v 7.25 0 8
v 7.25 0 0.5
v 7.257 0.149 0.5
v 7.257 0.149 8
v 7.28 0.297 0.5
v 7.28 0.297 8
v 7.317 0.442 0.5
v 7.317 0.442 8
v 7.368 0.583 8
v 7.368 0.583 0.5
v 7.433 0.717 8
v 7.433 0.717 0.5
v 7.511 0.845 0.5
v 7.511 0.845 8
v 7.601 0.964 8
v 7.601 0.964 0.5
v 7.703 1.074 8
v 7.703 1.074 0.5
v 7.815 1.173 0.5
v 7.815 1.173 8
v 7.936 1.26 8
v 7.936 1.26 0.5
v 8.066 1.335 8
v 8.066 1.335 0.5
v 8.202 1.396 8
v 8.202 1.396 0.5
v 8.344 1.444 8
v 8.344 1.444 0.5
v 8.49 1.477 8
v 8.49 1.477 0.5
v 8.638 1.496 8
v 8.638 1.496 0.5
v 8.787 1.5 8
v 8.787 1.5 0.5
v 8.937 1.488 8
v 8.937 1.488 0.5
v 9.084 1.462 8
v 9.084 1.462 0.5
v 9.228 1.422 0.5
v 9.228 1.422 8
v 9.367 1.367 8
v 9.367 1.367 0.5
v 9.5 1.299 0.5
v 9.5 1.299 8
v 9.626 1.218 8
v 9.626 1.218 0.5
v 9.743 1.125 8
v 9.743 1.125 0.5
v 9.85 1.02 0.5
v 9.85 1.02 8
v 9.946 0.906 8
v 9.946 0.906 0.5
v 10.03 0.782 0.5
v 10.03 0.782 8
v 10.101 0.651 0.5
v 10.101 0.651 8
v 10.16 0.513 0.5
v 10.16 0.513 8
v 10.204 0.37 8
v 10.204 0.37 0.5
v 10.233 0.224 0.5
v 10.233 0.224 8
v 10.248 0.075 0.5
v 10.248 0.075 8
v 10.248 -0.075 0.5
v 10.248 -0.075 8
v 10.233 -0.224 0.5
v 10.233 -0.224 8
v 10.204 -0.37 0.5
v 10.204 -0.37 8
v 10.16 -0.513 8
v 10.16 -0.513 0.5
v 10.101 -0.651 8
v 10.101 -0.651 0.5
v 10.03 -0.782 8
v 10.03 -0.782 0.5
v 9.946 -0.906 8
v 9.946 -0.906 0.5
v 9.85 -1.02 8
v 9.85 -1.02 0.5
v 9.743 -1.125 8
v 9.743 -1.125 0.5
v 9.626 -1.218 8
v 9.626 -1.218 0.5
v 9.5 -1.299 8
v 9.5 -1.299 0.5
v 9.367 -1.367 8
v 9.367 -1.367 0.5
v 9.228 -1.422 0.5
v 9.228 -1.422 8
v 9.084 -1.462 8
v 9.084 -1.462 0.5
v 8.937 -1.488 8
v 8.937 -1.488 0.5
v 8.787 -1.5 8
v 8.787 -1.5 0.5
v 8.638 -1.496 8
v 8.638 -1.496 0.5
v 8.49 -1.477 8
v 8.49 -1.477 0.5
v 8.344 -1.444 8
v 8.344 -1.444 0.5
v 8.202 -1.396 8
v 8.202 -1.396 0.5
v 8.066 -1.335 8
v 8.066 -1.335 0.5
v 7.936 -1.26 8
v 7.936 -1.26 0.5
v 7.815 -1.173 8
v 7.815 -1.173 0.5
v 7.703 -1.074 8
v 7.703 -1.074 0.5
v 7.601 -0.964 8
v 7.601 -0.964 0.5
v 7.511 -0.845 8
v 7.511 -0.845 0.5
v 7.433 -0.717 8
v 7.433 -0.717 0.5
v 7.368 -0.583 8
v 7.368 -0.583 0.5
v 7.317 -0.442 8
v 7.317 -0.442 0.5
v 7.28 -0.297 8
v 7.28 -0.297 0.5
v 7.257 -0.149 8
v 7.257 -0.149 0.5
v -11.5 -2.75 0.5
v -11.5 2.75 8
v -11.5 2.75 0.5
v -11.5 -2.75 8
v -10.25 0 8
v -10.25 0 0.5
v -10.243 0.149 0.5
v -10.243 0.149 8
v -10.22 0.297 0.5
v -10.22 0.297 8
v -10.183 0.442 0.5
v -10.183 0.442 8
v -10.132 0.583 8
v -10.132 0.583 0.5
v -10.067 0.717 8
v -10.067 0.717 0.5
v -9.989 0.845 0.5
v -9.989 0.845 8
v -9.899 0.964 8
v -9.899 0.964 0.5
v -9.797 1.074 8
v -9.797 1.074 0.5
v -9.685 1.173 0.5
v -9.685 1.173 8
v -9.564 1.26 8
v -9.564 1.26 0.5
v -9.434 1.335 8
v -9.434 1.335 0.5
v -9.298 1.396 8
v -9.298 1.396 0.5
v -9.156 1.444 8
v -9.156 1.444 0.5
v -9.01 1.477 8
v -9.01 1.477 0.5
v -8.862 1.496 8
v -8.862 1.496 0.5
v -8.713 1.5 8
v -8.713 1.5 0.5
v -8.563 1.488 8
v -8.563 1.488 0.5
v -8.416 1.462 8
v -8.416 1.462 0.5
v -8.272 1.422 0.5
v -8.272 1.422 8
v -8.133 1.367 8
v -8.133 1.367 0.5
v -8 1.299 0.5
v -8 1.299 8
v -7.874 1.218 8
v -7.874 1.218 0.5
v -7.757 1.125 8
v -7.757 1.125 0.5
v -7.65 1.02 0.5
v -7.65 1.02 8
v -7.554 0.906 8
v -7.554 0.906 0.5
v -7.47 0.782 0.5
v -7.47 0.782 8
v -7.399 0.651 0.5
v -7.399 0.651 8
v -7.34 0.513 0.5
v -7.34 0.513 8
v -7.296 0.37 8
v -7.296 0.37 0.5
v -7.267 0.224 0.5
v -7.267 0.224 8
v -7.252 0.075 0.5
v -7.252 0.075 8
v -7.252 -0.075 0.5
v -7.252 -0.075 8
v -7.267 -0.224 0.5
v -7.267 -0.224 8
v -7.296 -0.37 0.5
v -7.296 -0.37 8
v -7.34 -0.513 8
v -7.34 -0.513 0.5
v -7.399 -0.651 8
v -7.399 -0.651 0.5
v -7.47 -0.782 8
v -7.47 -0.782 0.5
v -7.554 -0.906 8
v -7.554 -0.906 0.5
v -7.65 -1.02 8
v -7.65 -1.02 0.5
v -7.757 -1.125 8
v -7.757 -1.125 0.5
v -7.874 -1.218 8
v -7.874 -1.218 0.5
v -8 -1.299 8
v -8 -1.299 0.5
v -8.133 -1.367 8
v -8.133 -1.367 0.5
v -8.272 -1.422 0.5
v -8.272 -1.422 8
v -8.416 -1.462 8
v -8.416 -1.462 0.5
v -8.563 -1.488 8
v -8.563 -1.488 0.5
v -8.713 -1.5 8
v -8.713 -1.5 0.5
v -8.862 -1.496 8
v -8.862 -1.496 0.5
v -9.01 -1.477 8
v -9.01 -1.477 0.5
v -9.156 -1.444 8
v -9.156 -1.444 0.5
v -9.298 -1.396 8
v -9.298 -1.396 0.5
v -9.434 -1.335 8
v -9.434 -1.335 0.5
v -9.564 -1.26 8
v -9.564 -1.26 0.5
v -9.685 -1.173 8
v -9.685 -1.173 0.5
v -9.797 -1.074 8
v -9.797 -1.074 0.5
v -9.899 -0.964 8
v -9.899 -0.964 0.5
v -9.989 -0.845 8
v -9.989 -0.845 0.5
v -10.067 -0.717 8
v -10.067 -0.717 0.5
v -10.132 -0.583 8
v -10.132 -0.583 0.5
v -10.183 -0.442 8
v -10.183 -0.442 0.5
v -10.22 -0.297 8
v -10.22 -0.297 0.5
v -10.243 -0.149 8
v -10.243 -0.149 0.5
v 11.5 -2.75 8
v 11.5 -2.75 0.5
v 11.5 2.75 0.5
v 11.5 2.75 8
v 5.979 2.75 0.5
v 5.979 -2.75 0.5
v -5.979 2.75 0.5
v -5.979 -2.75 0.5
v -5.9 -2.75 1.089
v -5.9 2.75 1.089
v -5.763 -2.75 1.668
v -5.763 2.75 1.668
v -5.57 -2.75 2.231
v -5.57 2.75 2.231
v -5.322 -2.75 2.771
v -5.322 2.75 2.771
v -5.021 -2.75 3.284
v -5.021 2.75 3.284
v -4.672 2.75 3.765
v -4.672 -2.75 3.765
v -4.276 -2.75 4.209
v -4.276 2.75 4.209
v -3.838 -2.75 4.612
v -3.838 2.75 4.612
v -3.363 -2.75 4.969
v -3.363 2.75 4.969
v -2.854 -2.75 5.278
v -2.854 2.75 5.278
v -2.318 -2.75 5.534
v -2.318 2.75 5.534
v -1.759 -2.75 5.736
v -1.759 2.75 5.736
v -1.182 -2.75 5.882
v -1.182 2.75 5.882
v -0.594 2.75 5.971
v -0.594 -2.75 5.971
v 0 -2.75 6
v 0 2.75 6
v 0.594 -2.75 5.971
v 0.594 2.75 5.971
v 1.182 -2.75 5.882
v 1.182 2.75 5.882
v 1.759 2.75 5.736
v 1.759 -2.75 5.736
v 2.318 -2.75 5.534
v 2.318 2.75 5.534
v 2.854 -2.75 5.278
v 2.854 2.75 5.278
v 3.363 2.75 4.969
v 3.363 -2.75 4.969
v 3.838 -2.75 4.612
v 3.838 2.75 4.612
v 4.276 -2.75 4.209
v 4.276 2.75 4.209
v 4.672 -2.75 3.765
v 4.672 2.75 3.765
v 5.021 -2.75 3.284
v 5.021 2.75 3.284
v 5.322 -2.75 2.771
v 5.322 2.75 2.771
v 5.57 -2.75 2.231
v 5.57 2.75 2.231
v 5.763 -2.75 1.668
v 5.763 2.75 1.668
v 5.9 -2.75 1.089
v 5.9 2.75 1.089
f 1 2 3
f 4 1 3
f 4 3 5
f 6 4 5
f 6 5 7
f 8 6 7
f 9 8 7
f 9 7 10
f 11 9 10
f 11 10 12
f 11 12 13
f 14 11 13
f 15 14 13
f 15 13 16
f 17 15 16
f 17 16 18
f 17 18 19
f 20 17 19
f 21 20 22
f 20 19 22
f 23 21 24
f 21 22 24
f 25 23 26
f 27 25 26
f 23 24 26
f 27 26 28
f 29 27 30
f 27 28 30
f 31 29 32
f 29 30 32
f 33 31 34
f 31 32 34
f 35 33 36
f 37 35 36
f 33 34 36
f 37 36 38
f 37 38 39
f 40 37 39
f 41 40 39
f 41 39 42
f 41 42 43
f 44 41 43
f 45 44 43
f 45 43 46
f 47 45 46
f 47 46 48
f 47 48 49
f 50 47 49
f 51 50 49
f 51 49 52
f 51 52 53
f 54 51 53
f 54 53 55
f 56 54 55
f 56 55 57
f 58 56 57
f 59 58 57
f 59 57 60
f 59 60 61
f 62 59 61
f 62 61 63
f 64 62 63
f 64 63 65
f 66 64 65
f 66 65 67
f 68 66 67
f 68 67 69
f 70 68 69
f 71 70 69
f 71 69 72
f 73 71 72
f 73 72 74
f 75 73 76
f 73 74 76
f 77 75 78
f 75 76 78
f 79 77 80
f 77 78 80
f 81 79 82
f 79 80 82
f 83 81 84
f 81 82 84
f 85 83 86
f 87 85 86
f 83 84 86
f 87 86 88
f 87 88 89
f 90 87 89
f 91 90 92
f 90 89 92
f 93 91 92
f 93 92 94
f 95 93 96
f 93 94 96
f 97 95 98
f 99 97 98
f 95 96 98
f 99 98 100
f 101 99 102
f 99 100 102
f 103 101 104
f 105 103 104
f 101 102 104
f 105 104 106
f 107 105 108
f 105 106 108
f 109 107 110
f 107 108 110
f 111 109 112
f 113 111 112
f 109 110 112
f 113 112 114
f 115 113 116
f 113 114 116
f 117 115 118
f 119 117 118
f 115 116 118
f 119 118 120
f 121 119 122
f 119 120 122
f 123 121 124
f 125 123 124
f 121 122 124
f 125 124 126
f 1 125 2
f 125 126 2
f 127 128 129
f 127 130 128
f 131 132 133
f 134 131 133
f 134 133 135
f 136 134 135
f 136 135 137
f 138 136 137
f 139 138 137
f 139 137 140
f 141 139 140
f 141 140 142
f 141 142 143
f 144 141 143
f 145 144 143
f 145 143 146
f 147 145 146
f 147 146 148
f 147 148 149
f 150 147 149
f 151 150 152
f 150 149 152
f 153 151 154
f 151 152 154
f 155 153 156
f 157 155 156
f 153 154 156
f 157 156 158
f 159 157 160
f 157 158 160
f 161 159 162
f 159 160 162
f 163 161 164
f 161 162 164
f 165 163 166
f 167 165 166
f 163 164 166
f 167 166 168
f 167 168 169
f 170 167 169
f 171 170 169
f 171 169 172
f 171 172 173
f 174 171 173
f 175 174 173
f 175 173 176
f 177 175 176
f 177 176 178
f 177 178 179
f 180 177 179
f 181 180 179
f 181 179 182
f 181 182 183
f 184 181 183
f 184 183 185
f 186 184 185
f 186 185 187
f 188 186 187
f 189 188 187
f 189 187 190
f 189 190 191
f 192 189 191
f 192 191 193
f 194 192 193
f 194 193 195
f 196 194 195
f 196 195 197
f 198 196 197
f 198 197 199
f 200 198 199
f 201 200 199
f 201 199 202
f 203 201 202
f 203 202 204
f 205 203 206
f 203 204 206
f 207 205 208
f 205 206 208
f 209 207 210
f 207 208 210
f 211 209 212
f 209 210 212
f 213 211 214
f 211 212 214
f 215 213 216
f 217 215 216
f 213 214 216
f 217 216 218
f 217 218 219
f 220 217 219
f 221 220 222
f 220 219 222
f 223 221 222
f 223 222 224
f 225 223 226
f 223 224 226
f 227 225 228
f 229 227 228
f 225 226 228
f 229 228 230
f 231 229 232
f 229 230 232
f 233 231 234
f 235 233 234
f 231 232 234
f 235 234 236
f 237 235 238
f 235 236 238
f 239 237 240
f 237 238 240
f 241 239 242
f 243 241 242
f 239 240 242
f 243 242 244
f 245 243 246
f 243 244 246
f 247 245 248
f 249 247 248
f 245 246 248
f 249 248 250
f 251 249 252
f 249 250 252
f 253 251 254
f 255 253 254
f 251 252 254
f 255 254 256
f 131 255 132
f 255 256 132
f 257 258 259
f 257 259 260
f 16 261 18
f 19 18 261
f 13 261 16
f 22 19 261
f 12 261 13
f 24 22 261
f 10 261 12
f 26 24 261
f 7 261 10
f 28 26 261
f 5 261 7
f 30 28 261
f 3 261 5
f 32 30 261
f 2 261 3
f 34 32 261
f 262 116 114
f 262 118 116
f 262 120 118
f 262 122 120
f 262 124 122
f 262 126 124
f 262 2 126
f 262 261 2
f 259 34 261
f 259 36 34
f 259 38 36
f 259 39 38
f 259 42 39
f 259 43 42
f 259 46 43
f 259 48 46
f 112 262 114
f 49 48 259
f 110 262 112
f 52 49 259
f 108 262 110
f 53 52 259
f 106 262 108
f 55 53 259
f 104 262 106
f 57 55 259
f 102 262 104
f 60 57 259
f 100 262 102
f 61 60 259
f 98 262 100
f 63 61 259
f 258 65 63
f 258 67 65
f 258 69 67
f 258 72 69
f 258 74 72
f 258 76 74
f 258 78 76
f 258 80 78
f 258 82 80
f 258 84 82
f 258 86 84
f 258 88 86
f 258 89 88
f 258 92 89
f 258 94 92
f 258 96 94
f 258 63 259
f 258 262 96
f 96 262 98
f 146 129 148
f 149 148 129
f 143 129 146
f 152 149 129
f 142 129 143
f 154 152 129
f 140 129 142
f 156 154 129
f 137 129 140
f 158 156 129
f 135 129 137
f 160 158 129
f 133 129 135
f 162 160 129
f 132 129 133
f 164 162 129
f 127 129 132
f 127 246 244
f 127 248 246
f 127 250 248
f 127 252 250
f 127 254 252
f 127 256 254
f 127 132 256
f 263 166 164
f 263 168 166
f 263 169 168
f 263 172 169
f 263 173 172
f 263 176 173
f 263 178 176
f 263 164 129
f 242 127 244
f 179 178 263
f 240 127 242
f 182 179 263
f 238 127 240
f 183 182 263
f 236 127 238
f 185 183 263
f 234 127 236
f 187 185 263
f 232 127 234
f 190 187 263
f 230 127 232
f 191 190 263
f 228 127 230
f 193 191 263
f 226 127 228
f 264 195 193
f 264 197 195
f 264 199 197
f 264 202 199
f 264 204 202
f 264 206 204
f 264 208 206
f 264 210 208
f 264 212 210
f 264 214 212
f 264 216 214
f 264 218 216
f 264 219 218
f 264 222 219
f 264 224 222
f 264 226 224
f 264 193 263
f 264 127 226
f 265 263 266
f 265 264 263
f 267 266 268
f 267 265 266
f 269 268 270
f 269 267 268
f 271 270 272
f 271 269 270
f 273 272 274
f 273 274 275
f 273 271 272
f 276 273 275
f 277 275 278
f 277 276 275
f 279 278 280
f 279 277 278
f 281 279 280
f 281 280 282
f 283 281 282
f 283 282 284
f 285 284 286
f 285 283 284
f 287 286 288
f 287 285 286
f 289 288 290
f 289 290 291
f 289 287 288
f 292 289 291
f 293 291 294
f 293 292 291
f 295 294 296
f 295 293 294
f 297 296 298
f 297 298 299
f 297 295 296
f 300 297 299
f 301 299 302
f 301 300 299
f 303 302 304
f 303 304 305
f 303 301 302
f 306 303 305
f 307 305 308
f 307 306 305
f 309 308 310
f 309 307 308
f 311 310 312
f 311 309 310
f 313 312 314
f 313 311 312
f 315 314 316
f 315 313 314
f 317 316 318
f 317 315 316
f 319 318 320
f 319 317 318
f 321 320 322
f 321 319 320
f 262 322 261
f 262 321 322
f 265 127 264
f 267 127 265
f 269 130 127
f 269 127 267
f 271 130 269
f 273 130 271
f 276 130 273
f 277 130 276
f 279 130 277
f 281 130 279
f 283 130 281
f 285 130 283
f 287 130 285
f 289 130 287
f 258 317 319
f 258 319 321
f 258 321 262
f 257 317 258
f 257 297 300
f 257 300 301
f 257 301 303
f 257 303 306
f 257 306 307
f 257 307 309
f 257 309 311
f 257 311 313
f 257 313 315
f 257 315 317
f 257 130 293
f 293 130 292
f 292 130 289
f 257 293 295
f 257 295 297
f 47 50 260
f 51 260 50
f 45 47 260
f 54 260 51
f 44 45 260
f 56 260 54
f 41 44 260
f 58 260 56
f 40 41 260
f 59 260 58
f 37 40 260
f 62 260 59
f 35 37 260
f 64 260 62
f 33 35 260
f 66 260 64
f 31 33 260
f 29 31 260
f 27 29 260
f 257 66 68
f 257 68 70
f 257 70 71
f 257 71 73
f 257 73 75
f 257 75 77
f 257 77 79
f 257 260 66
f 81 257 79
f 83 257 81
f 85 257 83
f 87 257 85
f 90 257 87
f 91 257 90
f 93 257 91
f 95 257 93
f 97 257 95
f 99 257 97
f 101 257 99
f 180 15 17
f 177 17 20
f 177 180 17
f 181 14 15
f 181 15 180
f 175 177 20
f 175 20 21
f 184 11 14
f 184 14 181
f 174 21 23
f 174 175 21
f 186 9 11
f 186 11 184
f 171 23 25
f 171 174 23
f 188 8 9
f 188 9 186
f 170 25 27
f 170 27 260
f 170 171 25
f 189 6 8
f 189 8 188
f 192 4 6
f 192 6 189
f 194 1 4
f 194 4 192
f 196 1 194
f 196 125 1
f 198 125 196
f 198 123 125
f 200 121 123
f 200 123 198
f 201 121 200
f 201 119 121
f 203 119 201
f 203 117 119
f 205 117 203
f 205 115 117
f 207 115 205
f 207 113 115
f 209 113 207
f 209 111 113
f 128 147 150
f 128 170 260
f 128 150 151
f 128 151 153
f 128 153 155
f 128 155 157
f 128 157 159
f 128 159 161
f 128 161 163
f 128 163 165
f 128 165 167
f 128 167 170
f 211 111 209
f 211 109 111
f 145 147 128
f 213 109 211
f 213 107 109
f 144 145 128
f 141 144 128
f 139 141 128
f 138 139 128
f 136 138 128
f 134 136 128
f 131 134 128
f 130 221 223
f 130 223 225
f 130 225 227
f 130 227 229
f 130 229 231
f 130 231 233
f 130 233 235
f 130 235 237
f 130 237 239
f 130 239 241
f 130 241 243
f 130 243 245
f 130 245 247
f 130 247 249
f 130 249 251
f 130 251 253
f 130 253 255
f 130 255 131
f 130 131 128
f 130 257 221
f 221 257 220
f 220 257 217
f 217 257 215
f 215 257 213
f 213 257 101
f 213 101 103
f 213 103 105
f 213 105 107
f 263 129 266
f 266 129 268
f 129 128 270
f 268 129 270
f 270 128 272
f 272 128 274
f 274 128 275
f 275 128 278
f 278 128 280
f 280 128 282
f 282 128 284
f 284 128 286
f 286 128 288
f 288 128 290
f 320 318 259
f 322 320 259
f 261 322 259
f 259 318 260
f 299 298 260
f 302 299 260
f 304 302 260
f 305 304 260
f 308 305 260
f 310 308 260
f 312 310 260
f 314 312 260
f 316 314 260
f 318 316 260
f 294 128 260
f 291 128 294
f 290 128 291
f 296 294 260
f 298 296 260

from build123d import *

# Parameters (mm, degrees)
F2_DEPTH = 2.75
F4_D     = 3


with BuildPart() as f2:
    # F1 (on Front) → F2 (new body, symmetric)
    with BuildSketch(Plane.XZ):
        with BuildLine():
            ThreePointArc((-5.9791303716, 0.5), (0, 6), (5.9791303716, 0.5))
            Line((5.9791303716, 0.5), (11.5, 0.5))
            Line((11.5, 0.5), (11.5, 8))
            Line((11.5, 8), (-11.5, 8))
            Line((-11.5, 8), (-11.5, 0.5))
            Line((-11.5, 0.5), (-5.9791303716, 0.5))
        make_face()
    extrude(amount=F2_DEPTH, both=True)

    # F4 (through all)
    with Locations(Plane.XY.offset(8)):
        with Locations((-8.75, 0), (8.75, 0)):
            Hole(F4_D / 2)


solid = f2.part
